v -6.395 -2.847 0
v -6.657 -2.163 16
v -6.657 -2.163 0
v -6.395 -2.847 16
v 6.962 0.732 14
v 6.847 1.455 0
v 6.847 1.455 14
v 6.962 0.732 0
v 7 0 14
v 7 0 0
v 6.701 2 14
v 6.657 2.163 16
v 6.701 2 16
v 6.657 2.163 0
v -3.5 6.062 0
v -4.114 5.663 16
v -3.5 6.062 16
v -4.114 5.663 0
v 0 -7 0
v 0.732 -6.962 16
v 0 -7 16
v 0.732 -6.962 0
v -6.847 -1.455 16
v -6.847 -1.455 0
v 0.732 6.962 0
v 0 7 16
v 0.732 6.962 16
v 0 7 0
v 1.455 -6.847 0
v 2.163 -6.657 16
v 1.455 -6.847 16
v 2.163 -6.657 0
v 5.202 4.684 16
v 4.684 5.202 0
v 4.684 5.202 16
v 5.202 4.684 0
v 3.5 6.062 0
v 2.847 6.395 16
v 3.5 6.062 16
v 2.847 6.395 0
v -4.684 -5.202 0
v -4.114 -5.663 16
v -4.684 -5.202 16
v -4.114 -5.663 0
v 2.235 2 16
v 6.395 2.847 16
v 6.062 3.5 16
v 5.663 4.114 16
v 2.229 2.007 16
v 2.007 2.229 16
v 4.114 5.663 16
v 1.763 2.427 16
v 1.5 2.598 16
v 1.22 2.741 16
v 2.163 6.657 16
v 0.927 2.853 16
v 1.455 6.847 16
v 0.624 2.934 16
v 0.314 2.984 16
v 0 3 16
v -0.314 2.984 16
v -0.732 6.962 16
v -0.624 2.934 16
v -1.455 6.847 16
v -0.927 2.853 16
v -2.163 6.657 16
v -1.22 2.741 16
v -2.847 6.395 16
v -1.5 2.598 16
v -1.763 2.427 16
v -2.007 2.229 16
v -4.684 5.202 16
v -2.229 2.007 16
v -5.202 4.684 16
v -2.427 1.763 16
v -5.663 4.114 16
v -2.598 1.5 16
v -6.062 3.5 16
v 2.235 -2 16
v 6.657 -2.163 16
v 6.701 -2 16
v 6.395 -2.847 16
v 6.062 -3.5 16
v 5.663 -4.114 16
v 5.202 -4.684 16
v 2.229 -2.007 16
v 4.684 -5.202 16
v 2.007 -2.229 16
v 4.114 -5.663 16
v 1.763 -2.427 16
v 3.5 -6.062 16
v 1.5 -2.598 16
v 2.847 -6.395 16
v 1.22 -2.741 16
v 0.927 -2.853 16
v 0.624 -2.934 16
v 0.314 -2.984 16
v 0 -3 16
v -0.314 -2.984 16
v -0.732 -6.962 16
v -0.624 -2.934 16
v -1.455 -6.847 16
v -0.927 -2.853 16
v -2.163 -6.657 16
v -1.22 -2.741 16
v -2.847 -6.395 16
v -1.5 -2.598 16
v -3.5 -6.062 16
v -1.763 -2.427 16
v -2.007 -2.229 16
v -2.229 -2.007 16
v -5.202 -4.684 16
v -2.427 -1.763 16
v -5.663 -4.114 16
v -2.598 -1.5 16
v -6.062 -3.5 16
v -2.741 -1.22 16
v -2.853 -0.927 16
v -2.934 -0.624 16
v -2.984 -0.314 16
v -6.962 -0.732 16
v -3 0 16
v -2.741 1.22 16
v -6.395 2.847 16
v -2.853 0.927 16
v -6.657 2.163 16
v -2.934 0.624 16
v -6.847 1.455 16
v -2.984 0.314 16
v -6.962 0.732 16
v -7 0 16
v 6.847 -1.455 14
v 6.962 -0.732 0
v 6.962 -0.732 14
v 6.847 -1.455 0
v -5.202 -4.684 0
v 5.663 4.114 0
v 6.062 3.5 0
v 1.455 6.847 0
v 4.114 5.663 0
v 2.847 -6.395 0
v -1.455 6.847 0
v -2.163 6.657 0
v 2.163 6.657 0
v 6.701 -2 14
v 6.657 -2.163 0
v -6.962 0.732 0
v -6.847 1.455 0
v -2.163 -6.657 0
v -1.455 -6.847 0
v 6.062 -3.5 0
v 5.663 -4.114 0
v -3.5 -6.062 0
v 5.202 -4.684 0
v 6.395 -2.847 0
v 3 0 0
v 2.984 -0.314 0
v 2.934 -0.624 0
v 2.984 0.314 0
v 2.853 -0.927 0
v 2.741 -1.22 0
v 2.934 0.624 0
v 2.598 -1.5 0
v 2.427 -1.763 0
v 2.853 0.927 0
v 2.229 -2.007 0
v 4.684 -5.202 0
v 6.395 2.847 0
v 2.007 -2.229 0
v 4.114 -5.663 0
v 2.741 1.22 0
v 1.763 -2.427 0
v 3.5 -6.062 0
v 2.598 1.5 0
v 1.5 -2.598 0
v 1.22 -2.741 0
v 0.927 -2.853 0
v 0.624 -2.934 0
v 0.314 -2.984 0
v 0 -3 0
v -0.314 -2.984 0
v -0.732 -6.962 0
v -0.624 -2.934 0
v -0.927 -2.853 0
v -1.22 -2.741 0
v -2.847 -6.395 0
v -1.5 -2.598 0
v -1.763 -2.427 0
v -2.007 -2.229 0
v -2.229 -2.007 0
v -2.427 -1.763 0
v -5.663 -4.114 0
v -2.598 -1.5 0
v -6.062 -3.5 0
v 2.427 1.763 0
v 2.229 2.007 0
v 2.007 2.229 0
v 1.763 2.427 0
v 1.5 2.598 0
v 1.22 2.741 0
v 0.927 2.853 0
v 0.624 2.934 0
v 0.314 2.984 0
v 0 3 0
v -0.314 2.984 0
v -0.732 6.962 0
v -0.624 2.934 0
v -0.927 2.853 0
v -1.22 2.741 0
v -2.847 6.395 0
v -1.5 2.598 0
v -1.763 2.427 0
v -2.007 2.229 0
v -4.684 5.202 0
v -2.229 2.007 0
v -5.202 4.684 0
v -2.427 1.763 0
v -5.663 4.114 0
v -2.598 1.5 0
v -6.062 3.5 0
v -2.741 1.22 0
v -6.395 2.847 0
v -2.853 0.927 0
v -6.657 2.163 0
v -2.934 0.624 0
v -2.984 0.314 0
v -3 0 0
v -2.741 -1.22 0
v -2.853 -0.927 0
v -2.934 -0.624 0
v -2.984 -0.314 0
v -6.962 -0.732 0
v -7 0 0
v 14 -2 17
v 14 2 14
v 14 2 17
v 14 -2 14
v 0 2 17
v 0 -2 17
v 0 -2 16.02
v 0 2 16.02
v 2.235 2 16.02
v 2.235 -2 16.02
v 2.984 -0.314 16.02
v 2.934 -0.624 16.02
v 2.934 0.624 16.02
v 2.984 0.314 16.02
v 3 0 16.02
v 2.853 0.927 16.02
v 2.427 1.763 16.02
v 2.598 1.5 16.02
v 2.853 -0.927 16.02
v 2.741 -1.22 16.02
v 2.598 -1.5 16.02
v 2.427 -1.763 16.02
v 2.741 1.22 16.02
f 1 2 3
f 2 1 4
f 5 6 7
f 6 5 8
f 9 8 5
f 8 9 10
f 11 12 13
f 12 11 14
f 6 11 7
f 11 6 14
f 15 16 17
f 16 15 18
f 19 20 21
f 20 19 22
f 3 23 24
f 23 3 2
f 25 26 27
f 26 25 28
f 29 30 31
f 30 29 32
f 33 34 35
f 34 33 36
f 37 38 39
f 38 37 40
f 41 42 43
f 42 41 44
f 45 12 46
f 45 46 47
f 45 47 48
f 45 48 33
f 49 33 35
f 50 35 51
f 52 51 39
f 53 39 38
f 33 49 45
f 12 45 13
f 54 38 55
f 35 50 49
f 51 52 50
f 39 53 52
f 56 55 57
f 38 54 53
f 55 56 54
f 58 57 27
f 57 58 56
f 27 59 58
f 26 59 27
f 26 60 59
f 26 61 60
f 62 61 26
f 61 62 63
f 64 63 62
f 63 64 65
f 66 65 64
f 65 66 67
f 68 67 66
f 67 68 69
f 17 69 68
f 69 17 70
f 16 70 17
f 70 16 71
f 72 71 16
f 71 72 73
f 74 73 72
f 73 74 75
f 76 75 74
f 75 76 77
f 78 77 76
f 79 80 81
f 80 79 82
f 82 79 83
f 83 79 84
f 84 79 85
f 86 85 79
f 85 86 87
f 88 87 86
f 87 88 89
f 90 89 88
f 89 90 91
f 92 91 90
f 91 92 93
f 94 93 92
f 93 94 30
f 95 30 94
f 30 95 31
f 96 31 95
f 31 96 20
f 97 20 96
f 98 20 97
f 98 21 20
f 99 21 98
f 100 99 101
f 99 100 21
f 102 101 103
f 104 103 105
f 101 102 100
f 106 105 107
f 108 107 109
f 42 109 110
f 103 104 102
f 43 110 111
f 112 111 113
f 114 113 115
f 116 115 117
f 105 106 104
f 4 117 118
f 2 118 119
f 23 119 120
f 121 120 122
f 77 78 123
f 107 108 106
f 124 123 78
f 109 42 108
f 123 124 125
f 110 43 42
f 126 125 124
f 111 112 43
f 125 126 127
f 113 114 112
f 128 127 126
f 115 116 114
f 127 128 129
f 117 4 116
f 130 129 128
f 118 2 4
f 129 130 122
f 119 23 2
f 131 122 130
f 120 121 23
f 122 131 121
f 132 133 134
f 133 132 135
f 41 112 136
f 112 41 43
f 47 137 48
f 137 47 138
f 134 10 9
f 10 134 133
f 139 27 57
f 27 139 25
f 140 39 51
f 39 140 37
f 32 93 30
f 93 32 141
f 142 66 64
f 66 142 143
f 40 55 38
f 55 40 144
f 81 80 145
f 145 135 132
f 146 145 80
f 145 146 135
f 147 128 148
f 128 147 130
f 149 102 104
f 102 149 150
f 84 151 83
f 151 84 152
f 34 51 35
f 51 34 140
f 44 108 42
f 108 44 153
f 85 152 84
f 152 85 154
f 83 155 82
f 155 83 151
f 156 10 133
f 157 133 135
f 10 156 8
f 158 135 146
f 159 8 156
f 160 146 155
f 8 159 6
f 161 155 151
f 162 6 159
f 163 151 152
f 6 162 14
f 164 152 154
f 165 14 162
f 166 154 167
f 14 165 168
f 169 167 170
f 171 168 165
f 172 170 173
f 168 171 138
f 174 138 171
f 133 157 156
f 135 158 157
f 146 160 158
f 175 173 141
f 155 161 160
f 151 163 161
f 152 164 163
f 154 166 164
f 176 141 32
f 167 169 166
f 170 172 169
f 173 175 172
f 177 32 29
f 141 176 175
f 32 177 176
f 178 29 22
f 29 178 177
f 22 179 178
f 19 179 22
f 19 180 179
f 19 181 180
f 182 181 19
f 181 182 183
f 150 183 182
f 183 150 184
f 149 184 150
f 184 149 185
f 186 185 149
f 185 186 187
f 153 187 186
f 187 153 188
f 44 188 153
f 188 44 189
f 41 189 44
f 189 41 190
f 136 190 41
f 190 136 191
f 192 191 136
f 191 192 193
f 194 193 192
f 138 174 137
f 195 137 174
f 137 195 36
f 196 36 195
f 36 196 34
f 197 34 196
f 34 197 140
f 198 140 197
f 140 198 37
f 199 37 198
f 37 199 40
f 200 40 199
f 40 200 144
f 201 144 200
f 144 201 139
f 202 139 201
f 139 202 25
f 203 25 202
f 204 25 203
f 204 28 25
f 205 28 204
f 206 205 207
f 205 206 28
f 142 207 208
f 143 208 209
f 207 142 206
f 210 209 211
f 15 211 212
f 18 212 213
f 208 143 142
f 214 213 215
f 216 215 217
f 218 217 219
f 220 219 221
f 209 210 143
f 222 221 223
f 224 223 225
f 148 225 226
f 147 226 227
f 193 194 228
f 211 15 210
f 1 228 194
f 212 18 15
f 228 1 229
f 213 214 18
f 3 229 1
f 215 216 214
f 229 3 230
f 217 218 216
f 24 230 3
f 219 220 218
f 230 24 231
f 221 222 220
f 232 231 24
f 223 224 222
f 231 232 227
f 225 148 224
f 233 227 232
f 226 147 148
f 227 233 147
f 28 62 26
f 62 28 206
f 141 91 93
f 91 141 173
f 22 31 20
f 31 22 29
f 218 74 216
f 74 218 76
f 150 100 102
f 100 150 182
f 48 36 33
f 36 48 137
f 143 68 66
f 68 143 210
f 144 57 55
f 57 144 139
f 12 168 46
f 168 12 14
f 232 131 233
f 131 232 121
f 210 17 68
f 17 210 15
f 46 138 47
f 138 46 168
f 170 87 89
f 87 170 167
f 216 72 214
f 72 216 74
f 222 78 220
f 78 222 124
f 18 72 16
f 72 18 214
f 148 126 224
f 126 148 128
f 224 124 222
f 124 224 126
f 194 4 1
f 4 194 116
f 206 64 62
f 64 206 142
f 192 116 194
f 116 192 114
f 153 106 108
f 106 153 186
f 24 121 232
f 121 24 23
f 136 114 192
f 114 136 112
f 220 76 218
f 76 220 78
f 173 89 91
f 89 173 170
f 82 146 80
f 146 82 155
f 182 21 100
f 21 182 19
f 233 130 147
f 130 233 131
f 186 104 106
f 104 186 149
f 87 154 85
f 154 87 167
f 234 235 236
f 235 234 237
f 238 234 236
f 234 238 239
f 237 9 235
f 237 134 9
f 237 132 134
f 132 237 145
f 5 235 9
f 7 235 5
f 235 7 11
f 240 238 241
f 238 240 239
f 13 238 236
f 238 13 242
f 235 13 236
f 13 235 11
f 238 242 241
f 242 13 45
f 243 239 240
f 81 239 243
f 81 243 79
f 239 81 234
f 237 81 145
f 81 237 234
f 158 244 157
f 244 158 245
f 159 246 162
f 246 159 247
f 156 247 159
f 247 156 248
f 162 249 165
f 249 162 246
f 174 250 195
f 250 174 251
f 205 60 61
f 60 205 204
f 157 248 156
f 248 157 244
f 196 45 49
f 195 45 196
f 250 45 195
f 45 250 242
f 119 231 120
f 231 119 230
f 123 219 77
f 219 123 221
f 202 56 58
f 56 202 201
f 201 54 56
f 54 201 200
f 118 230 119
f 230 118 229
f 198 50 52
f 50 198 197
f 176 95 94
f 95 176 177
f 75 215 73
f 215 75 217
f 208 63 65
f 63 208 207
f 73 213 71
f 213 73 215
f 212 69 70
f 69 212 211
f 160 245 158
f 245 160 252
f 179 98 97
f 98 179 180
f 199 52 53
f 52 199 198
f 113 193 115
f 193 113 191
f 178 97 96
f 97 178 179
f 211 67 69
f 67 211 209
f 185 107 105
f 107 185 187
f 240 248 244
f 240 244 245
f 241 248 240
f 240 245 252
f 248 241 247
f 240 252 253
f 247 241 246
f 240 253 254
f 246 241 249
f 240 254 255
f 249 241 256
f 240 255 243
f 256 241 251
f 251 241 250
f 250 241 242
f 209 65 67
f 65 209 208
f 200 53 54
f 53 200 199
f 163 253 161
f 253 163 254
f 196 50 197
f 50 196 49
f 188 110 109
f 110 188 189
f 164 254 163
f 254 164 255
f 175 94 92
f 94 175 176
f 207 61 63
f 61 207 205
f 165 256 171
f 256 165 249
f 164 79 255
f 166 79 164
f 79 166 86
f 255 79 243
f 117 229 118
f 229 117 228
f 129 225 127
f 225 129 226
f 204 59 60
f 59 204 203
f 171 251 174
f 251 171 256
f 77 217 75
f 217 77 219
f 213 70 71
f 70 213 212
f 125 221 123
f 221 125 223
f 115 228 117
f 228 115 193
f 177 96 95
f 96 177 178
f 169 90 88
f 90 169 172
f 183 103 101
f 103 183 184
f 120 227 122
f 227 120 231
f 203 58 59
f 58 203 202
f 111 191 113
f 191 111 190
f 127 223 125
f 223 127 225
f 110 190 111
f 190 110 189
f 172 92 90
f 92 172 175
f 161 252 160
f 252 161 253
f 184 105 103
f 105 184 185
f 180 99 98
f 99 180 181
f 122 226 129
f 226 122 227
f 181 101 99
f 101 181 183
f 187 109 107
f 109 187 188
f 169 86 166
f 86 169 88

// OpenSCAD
// Quarter-turn cam lock.
$fn = 60;
eps = 0.02;
body_d = 14;
body_l = 16;
arm_l = 14;
difference() { union() { cylinder(d=body_d,h=body_l); translate([0,-2,body_l-2]) cube([arm_l,4,3]); } translate([0,0,-eps]) cylinder(d=6,h=body_l+2*eps); }
